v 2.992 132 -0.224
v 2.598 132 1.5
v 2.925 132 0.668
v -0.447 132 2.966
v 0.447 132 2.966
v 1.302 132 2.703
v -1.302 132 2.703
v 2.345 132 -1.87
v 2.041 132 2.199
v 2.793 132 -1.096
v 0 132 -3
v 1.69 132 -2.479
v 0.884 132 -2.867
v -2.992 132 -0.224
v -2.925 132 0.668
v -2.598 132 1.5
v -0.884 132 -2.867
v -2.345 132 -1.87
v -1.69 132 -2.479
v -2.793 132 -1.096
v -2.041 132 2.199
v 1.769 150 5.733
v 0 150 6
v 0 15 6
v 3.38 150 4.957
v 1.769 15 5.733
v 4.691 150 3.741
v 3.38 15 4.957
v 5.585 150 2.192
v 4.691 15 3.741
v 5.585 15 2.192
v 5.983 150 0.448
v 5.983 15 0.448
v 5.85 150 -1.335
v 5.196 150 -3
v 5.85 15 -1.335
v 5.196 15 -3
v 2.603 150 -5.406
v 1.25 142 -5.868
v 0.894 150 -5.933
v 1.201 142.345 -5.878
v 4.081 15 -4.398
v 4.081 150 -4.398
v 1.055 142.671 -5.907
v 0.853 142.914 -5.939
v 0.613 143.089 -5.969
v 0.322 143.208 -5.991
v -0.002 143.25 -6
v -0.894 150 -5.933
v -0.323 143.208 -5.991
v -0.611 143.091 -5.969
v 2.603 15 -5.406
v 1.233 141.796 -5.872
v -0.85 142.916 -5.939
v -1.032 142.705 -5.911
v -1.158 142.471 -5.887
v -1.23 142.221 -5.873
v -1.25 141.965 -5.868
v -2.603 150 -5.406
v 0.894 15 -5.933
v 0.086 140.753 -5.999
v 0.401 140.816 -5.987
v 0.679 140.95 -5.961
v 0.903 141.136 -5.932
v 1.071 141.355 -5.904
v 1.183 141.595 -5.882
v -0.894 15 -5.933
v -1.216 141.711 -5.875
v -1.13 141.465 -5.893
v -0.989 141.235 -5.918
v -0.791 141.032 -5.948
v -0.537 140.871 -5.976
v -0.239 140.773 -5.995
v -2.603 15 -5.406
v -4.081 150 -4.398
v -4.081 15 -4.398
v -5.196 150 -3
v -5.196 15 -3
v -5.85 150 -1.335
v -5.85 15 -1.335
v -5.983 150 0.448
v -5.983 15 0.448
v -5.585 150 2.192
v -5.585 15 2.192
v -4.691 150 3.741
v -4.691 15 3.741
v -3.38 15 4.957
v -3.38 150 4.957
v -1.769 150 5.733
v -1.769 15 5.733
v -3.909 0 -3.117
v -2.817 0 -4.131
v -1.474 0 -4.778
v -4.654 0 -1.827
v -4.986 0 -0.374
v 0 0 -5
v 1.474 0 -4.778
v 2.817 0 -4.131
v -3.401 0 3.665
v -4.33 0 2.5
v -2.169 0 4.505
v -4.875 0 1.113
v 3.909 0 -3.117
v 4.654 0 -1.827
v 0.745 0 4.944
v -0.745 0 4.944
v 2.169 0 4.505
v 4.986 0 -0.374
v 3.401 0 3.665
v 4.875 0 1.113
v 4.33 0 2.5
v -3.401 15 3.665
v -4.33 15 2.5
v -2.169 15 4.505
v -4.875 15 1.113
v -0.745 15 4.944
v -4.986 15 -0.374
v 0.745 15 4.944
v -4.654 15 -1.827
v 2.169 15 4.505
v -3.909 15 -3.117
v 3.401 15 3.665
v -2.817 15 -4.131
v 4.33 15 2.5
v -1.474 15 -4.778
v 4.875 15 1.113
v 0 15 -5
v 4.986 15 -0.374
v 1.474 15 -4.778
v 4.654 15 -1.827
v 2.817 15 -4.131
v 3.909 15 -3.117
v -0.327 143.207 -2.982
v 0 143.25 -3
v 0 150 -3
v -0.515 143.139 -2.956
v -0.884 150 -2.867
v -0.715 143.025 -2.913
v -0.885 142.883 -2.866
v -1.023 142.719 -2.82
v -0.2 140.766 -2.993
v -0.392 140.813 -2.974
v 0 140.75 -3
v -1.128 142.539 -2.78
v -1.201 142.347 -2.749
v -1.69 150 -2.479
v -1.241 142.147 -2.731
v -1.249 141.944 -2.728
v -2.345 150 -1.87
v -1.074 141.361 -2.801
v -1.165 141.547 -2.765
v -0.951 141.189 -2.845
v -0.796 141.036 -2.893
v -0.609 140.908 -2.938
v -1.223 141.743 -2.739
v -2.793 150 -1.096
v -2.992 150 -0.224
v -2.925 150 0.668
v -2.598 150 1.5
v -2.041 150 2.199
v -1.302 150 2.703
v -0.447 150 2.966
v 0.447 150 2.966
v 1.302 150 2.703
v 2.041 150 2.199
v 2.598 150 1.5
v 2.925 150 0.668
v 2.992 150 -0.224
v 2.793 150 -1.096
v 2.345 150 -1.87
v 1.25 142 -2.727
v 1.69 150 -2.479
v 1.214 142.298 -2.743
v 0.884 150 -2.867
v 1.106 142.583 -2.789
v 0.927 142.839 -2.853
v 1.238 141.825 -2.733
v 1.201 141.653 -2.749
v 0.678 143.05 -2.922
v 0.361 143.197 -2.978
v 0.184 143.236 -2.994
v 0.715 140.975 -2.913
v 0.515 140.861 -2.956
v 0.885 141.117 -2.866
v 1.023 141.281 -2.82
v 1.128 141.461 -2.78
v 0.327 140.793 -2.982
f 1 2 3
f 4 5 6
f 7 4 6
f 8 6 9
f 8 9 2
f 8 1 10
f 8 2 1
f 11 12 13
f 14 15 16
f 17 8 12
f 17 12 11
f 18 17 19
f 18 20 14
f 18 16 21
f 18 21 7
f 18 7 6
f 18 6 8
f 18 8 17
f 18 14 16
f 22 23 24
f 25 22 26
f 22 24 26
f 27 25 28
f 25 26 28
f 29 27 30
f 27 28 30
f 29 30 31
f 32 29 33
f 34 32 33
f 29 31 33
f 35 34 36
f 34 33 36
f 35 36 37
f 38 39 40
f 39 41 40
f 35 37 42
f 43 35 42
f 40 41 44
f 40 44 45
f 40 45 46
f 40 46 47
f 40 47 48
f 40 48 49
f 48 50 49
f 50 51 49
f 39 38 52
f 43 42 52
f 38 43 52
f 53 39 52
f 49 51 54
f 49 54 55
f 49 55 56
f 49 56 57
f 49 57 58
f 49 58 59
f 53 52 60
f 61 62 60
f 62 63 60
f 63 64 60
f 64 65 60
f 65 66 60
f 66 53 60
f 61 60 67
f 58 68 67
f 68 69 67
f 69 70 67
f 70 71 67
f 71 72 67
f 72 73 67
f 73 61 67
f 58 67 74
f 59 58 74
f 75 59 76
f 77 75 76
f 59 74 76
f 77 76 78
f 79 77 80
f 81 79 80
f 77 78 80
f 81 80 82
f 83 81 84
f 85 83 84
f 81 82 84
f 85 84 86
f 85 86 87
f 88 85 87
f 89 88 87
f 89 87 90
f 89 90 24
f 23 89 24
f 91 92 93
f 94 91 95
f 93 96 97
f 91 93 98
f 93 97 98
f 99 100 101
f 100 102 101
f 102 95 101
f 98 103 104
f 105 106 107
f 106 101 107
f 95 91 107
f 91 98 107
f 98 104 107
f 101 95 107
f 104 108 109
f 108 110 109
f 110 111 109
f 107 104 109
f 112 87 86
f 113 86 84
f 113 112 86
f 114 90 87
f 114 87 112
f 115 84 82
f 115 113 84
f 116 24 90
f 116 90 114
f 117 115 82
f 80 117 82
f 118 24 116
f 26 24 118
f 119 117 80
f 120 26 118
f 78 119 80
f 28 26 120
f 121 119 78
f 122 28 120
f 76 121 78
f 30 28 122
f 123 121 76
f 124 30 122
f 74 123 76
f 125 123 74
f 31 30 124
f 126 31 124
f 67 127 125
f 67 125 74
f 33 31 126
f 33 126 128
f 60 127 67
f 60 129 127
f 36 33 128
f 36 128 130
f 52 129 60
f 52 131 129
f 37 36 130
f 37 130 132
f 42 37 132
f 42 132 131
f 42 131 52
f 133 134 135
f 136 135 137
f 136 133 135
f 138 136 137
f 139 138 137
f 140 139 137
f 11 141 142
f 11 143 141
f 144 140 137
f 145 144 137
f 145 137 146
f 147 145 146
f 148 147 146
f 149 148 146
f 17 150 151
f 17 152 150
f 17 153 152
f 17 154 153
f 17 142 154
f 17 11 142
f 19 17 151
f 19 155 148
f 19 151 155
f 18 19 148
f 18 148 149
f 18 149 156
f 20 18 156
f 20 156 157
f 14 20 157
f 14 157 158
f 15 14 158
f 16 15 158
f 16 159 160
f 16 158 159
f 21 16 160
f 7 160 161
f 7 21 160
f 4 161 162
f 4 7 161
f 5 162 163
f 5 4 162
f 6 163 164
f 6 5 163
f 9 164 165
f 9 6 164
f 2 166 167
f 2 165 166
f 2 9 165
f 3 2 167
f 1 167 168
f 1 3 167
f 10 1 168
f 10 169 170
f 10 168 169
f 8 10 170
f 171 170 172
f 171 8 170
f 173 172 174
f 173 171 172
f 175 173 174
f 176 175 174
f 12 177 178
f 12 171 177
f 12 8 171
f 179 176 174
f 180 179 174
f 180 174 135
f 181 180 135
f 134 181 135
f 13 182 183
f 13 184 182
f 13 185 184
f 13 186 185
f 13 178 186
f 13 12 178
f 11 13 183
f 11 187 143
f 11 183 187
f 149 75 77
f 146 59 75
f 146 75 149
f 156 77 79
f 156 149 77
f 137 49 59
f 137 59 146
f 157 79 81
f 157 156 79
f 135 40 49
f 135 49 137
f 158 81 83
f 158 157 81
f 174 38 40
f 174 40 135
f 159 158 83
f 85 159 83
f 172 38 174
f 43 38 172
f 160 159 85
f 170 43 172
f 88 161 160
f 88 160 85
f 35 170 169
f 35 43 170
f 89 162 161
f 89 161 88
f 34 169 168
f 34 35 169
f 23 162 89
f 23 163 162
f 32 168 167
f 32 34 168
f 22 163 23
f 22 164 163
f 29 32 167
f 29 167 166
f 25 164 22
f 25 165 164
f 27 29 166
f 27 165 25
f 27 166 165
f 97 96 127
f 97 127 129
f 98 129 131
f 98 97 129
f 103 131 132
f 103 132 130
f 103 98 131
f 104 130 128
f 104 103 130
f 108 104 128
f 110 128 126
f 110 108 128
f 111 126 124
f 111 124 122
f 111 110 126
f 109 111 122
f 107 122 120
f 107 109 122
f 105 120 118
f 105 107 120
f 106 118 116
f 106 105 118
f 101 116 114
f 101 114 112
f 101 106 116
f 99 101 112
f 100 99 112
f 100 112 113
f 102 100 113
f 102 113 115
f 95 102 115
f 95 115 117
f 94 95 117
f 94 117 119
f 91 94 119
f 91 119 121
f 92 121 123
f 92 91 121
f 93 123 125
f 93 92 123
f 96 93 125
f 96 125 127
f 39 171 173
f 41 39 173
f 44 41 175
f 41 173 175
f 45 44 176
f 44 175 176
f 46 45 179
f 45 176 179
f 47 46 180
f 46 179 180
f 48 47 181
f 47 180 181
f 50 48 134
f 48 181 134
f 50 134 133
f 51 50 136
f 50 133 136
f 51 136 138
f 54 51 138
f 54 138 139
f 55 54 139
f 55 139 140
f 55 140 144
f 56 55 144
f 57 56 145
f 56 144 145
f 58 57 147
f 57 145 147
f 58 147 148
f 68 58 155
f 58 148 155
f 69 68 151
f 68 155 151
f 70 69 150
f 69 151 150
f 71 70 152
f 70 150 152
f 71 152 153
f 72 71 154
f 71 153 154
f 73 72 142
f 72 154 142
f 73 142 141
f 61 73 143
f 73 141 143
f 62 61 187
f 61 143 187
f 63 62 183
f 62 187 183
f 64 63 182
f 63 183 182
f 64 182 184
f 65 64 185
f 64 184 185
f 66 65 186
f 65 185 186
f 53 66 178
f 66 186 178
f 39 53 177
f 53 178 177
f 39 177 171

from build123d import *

# Parameters (mm, degrees)
SKETCH_1_R               = 6
EXTRUDE_2_DEPTH          = 150
CUT_EXTRUDE_2_DEPTH      = 151.239808307
CUT_EXTRUDE_2_DEPTH_BACK = 18
SKETCH_3_R               = 3
CUT_EXTRUDE_4_REACH      = 152.24
CUT_EXTRUDE_4_END_RADIUS = 6
SKETCH_4_R               = 1.25
SKETCH_5_R               = 6
SKETCH_5_R_2             = 5
CUT_EXTRUDE_5_DEPTH      = 15


with BuildPart() as part:
    # ｽｹｯﾁ1 → ﾎﾞｽ - 押し出し2 (new body)
    with BuildSketch(Plane(origin=(0, 0, 0), x_dir=(1, 0, 0), z_dir=(0, 1, 0))):
        with Locations(Location((0, 0, 0), (0, 0, 270))):
            Circle(SKETCH_1_R)
    extrude(amount=EXTRUDE_2_DEPTH)

    # ｽｹｯﾁ3 → ｶｯﾄ - 押し出し2 (cut, two sides: drawn at the far end of the back side and taken through both)
    with BuildSketch(Plane(origin=(0, 150, 0), x_dir=(1, 0, 0), z_dir=(0, 1, 0)).offset(-CUT_EXTRUDE_2_DEPTH_BACK)):
        with Locations(Location((0, 0, 0), (0, 0, 90))):
            Circle(SKETCH_3_R)
    extrude(amount=CUT_EXTRUDE_2_DEPTH + CUT_EXTRUDE_2_DEPTH_BACK, mode=Mode.SUBTRACT)

    # ｶｯﾄ - 押し出し4: up to this cylinder (the profile starts inside it)
    cut_extrude_4_end = Plane(origin=(0, 142, 0), z_dir=(0, -1, 0)) * Cylinder(CUT_EXTRUDE_4_END_RADIUS, 317.48, mode=Mode.PRIVATE)
    # ｽｹｯﾁ4 → ｶｯﾄ - 押し出し4 (cut, up to the surface)
    with BuildSketch(Plane.XY, mode=Mode.PRIVATE) as cut_extrude_4_sk1:
        with Locations((0, 142)):
            Circle(SKETCH_4_R)
    cut_extrude_4_tool1 = extrude(cut_extrude_4_sk1.sketch, amount=-CUT_EXTRUDE_4_REACH, mode=Mode.PRIVATE) & cut_extrude_4_end
    add(cut_extrude_4_tool1.solids().sort_by_distance((0, 142, 0))[0], mode=Mode.SUBTRACT)

    # ｽｹｯﾁ5 → ｶｯﾄ - 押し出し5 (cut)
    with BuildSketch(Plane.XZ):
        with Locations(Location((0, 0, 0), (0, 0, 270))):
            Circle(SKETCH_5_R)
        with Locations(Location((0, 0, 0), (0, 0, 270))):
            Circle(SKETCH_5_R_2, mode=Mode.SUBTRACT)
    extrude(amount=-CUT_EXTRUDE_5_DEPTH, mode=Mode.SUBTRACT)


solid = part.part
